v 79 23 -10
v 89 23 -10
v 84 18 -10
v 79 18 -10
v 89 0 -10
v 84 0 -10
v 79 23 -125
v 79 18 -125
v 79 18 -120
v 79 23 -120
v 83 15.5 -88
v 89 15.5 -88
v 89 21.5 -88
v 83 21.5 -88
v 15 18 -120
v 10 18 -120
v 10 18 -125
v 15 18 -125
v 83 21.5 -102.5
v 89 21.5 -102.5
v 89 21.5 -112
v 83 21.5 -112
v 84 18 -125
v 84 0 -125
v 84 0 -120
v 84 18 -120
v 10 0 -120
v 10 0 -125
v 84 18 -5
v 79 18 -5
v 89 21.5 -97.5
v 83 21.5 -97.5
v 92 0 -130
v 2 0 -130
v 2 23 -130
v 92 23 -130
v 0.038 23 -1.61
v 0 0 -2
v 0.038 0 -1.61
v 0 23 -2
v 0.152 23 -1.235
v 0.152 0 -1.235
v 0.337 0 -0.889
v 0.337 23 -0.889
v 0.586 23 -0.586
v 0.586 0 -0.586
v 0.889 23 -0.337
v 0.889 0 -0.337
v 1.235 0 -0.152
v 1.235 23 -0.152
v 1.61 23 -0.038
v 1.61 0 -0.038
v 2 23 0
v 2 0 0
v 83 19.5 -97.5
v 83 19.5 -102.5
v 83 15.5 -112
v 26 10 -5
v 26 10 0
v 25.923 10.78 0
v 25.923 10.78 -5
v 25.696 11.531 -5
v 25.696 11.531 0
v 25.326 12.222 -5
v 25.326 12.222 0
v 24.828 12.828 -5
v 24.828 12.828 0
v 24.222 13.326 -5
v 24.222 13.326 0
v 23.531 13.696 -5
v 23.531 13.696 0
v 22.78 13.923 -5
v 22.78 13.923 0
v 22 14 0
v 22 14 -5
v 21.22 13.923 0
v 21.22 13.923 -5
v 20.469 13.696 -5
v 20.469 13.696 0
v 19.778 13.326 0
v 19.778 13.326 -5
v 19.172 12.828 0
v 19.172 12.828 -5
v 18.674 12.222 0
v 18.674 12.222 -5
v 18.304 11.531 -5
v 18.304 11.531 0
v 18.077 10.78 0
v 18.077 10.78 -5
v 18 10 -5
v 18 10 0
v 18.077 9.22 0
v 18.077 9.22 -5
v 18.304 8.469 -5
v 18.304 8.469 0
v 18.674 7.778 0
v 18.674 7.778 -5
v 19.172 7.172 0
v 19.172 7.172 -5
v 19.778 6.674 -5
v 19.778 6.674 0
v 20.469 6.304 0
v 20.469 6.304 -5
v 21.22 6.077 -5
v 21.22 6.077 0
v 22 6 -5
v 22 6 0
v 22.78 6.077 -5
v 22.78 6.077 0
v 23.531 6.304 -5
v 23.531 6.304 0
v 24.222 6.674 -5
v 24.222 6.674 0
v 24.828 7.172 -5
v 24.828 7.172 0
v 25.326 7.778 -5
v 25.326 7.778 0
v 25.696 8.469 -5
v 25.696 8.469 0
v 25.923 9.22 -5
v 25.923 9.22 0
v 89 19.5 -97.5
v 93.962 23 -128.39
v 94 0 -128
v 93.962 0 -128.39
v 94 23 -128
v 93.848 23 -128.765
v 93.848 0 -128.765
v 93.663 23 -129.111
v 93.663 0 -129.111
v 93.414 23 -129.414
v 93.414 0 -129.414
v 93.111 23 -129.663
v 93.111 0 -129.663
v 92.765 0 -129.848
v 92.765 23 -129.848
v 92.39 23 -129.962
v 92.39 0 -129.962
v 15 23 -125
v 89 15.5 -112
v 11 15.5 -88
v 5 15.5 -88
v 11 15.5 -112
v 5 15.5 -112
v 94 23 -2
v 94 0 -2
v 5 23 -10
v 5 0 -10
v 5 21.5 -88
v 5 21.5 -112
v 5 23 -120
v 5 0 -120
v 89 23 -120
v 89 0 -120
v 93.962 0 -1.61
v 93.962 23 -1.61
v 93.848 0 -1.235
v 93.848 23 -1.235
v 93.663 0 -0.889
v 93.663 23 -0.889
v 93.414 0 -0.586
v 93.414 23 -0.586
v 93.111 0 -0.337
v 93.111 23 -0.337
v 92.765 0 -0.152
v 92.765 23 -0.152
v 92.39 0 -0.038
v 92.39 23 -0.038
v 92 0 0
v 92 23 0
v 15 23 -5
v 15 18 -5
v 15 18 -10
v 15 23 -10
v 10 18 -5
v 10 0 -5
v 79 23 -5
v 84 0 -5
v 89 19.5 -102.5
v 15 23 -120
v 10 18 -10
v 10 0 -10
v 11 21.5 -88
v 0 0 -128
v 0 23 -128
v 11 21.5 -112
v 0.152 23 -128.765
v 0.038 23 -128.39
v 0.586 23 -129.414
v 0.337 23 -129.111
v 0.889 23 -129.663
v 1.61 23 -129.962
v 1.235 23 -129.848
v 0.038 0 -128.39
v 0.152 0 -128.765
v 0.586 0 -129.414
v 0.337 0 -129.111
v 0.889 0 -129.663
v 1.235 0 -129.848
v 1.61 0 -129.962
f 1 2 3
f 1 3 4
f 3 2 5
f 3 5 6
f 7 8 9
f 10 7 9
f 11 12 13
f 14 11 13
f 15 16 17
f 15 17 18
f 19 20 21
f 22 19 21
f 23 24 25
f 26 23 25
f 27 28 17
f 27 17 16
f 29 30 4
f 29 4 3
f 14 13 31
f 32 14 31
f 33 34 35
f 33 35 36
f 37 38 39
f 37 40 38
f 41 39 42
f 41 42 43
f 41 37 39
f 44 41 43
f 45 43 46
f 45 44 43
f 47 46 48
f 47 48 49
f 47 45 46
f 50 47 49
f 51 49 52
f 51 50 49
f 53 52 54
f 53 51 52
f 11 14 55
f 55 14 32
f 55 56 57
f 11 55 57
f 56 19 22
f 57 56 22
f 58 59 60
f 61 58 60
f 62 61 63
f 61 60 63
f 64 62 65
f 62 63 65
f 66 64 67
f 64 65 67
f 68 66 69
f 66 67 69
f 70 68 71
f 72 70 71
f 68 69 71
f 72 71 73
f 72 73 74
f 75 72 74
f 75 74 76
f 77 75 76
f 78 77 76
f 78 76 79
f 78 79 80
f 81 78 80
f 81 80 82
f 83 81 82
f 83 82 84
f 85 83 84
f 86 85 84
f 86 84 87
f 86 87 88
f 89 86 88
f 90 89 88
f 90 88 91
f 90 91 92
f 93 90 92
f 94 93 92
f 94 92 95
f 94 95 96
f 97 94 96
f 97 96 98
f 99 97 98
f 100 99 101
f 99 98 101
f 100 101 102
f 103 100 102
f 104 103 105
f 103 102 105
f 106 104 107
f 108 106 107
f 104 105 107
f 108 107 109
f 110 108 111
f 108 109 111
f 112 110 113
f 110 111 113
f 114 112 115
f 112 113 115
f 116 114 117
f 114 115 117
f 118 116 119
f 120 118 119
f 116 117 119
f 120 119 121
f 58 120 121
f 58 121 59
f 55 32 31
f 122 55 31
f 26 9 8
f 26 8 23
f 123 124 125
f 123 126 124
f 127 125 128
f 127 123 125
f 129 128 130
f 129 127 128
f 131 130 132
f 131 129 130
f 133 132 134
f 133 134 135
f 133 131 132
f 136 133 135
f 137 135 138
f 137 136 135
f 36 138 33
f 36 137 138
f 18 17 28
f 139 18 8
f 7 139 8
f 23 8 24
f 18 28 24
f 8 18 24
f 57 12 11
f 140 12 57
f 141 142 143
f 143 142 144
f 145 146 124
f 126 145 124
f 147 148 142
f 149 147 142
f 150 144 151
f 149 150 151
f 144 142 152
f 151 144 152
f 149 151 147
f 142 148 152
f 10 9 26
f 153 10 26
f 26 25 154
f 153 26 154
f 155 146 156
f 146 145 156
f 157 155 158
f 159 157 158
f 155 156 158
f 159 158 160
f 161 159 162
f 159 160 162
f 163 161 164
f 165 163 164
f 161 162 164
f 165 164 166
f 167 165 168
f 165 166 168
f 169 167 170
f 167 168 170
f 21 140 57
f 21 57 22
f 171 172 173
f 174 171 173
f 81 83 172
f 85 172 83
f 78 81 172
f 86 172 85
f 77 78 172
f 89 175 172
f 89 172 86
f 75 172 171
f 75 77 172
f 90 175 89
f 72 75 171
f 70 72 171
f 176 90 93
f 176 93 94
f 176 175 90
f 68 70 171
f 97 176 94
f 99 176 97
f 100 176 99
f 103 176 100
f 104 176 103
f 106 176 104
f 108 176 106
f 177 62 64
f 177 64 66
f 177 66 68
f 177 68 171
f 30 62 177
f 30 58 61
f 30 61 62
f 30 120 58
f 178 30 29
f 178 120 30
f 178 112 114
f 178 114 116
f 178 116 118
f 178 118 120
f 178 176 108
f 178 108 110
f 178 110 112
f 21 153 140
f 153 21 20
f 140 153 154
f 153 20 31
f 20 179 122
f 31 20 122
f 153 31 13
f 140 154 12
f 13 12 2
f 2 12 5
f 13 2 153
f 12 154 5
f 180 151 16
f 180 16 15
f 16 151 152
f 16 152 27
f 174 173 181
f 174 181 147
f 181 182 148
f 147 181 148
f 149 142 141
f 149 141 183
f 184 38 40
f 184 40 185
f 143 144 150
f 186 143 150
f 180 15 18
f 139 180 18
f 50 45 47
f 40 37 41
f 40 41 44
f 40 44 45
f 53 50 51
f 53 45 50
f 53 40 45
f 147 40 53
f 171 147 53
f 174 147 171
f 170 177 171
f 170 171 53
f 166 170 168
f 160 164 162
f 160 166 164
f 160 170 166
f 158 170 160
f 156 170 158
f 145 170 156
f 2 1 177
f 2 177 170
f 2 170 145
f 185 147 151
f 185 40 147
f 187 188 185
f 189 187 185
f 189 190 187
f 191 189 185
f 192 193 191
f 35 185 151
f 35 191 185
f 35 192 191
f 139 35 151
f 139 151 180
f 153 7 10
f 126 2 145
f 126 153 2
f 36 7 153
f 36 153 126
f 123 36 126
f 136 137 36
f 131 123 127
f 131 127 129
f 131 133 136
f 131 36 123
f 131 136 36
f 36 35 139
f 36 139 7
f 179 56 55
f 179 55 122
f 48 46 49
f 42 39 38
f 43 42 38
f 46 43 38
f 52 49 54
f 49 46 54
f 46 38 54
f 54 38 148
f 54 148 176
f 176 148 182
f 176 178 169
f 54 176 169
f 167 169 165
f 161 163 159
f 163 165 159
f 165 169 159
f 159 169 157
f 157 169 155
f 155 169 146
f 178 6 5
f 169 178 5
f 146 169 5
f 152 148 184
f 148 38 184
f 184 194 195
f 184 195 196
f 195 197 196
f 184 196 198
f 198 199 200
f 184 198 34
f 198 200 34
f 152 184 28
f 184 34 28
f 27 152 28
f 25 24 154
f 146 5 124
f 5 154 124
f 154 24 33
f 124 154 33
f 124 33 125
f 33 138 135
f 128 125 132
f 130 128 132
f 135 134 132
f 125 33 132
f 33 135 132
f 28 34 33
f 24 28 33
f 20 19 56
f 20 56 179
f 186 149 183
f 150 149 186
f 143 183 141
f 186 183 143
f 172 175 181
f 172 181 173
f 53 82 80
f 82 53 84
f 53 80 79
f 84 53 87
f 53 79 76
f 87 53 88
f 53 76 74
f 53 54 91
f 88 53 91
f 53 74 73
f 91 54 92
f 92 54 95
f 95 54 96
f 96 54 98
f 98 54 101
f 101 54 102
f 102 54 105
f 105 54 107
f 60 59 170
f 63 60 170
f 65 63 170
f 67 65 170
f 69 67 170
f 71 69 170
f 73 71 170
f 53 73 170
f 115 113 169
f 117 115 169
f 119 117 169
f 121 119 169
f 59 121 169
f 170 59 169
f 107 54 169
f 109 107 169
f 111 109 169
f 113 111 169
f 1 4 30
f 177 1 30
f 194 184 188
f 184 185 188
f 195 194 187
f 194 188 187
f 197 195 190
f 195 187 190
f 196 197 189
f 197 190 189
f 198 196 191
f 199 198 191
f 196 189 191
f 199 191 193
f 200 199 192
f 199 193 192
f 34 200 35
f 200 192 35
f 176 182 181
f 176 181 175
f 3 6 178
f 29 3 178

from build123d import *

# Parameters (mm, degrees)
SKETCH1_W            = 94
SKETCH1_H            = 130
BOSS_EXTRUDE1_DEPTH  = 23
SKETCH3_W            = 24
SKETCH3_H            = 6
BOSS_EXTRUDE2_DEPTH  = 6
SKETCH4_W            = 6
SKETCH4_H            = 5
CUT_EXTRUDE1_DEPTH   = 2
SKETCH5_W            = 5
SKETCH5_H            = 5
CUT_EXTRUDE2_DEPTH   = 18
LPATTERN1_COUNT      = 2
LPATTERN1_PITCH      = 69
LPATTERN1_COUNT_DIR2 = 2
LPATTERN1_PITCH_DIR2 = 115
FILLET1_R            = 2
SKETCH6_R            = 4
CUT_EXTRUDE3_DEPTH   = 7


with BuildPart() as part:
    # Sketch1 → Boss-Extrude1 (new body)
    with BuildSketch(Plane(origin=(0, 0, 0), x_dir=(1, 0, 0), z_dir=(0, 1, 0))):
        with Locations((47, 65)):
            Rectangle(SKETCH1_W, SKETCH1_H)
        Polygon((79, 125), (79, 120), (89, 120), (89, 10), (79, 10), (79, 5), (15, 5), (15, 10), (5, 10), (5, 120), (15, 120), (15, 125), align=None, mode=Mode.SUBTRACT)
    extrude(amount=BOSS_EXTRUDE1_DEPTH)

    # Sketch3 → Boss-Extrude2 (add)
    with BuildSketch(Plane(origin=(5, 0, 0), x_dir=(0, 0, -1), z_dir=(1, 0, 0))):
        with Locations((100, 18.5)):
            Rectangle(SKETCH3_W, SKETCH3_H)
    boss_extrude2 = extrude(amount=BOSS_EXTRUDE2_DEPTH)

    # Mirror3: Boss-Extrude2 across plane
    add(boss_extrude2.mirror(Plane.ZY.offset(-47)))

    # Sketch4 → Cut-Extrude1 (cut)
    with BuildSketch(Plane(origin=(0, 21.5, 0), x_dir=(1, 0, 0), z_dir=(0, 1, 0))):
        with Locations((86, 100)):
            Rectangle(SKETCH4_W, SKETCH4_H)
    extrude(amount=-CUT_EXTRUDE1_DEPTH, mode=Mode.SUBTRACT)

    # Sketch5 → Cut-Extrude2 (cut)
    with BuildSketch(Plane.XZ):
        with Locations((81.5, -122.5)):
            Rectangle(SKETCH5_W, SKETCH5_H)
    cut_extrude2 = extrude(amount=-CUT_EXTRUDE2_DEPTH, mode=Mode.SUBTRACT)

    # LPattern1: Cut-Extrude2 2 × 2
    with Locations(*[(-i * LPATTERN1_PITCH, 0, j * LPATTERN1_PITCH_DIR2) for i in range(LPATTERN1_COUNT) for j in range(LPATTERN1_COUNT_DIR2) if (i, j) != (0, 0)]):
        add(cut_extrude2, mode=Mode.SUBTRACT)

    # Fillet1
    fillet1_edges = [part.edges().sort_by_distance(p)[0] for p in [
        (0, 11.5, -130),
        (94, 11.5, -130),
        (94, 11.5, 0),
        (0, 11.5, 0),
    ]]
    fillet(fillet1_edges, radius=FILLET1_R)

    # Sketch6 → Cut-Extrude3 (cut)
    with BuildSketch(Plane.XY):
        with Locations((22, 10)):
            Circle(SKETCH6_R)
    extrude(amount=-CUT_EXTRUDE3_DEPTH, mode=Mode.SUBTRACT)


solid = part.part
